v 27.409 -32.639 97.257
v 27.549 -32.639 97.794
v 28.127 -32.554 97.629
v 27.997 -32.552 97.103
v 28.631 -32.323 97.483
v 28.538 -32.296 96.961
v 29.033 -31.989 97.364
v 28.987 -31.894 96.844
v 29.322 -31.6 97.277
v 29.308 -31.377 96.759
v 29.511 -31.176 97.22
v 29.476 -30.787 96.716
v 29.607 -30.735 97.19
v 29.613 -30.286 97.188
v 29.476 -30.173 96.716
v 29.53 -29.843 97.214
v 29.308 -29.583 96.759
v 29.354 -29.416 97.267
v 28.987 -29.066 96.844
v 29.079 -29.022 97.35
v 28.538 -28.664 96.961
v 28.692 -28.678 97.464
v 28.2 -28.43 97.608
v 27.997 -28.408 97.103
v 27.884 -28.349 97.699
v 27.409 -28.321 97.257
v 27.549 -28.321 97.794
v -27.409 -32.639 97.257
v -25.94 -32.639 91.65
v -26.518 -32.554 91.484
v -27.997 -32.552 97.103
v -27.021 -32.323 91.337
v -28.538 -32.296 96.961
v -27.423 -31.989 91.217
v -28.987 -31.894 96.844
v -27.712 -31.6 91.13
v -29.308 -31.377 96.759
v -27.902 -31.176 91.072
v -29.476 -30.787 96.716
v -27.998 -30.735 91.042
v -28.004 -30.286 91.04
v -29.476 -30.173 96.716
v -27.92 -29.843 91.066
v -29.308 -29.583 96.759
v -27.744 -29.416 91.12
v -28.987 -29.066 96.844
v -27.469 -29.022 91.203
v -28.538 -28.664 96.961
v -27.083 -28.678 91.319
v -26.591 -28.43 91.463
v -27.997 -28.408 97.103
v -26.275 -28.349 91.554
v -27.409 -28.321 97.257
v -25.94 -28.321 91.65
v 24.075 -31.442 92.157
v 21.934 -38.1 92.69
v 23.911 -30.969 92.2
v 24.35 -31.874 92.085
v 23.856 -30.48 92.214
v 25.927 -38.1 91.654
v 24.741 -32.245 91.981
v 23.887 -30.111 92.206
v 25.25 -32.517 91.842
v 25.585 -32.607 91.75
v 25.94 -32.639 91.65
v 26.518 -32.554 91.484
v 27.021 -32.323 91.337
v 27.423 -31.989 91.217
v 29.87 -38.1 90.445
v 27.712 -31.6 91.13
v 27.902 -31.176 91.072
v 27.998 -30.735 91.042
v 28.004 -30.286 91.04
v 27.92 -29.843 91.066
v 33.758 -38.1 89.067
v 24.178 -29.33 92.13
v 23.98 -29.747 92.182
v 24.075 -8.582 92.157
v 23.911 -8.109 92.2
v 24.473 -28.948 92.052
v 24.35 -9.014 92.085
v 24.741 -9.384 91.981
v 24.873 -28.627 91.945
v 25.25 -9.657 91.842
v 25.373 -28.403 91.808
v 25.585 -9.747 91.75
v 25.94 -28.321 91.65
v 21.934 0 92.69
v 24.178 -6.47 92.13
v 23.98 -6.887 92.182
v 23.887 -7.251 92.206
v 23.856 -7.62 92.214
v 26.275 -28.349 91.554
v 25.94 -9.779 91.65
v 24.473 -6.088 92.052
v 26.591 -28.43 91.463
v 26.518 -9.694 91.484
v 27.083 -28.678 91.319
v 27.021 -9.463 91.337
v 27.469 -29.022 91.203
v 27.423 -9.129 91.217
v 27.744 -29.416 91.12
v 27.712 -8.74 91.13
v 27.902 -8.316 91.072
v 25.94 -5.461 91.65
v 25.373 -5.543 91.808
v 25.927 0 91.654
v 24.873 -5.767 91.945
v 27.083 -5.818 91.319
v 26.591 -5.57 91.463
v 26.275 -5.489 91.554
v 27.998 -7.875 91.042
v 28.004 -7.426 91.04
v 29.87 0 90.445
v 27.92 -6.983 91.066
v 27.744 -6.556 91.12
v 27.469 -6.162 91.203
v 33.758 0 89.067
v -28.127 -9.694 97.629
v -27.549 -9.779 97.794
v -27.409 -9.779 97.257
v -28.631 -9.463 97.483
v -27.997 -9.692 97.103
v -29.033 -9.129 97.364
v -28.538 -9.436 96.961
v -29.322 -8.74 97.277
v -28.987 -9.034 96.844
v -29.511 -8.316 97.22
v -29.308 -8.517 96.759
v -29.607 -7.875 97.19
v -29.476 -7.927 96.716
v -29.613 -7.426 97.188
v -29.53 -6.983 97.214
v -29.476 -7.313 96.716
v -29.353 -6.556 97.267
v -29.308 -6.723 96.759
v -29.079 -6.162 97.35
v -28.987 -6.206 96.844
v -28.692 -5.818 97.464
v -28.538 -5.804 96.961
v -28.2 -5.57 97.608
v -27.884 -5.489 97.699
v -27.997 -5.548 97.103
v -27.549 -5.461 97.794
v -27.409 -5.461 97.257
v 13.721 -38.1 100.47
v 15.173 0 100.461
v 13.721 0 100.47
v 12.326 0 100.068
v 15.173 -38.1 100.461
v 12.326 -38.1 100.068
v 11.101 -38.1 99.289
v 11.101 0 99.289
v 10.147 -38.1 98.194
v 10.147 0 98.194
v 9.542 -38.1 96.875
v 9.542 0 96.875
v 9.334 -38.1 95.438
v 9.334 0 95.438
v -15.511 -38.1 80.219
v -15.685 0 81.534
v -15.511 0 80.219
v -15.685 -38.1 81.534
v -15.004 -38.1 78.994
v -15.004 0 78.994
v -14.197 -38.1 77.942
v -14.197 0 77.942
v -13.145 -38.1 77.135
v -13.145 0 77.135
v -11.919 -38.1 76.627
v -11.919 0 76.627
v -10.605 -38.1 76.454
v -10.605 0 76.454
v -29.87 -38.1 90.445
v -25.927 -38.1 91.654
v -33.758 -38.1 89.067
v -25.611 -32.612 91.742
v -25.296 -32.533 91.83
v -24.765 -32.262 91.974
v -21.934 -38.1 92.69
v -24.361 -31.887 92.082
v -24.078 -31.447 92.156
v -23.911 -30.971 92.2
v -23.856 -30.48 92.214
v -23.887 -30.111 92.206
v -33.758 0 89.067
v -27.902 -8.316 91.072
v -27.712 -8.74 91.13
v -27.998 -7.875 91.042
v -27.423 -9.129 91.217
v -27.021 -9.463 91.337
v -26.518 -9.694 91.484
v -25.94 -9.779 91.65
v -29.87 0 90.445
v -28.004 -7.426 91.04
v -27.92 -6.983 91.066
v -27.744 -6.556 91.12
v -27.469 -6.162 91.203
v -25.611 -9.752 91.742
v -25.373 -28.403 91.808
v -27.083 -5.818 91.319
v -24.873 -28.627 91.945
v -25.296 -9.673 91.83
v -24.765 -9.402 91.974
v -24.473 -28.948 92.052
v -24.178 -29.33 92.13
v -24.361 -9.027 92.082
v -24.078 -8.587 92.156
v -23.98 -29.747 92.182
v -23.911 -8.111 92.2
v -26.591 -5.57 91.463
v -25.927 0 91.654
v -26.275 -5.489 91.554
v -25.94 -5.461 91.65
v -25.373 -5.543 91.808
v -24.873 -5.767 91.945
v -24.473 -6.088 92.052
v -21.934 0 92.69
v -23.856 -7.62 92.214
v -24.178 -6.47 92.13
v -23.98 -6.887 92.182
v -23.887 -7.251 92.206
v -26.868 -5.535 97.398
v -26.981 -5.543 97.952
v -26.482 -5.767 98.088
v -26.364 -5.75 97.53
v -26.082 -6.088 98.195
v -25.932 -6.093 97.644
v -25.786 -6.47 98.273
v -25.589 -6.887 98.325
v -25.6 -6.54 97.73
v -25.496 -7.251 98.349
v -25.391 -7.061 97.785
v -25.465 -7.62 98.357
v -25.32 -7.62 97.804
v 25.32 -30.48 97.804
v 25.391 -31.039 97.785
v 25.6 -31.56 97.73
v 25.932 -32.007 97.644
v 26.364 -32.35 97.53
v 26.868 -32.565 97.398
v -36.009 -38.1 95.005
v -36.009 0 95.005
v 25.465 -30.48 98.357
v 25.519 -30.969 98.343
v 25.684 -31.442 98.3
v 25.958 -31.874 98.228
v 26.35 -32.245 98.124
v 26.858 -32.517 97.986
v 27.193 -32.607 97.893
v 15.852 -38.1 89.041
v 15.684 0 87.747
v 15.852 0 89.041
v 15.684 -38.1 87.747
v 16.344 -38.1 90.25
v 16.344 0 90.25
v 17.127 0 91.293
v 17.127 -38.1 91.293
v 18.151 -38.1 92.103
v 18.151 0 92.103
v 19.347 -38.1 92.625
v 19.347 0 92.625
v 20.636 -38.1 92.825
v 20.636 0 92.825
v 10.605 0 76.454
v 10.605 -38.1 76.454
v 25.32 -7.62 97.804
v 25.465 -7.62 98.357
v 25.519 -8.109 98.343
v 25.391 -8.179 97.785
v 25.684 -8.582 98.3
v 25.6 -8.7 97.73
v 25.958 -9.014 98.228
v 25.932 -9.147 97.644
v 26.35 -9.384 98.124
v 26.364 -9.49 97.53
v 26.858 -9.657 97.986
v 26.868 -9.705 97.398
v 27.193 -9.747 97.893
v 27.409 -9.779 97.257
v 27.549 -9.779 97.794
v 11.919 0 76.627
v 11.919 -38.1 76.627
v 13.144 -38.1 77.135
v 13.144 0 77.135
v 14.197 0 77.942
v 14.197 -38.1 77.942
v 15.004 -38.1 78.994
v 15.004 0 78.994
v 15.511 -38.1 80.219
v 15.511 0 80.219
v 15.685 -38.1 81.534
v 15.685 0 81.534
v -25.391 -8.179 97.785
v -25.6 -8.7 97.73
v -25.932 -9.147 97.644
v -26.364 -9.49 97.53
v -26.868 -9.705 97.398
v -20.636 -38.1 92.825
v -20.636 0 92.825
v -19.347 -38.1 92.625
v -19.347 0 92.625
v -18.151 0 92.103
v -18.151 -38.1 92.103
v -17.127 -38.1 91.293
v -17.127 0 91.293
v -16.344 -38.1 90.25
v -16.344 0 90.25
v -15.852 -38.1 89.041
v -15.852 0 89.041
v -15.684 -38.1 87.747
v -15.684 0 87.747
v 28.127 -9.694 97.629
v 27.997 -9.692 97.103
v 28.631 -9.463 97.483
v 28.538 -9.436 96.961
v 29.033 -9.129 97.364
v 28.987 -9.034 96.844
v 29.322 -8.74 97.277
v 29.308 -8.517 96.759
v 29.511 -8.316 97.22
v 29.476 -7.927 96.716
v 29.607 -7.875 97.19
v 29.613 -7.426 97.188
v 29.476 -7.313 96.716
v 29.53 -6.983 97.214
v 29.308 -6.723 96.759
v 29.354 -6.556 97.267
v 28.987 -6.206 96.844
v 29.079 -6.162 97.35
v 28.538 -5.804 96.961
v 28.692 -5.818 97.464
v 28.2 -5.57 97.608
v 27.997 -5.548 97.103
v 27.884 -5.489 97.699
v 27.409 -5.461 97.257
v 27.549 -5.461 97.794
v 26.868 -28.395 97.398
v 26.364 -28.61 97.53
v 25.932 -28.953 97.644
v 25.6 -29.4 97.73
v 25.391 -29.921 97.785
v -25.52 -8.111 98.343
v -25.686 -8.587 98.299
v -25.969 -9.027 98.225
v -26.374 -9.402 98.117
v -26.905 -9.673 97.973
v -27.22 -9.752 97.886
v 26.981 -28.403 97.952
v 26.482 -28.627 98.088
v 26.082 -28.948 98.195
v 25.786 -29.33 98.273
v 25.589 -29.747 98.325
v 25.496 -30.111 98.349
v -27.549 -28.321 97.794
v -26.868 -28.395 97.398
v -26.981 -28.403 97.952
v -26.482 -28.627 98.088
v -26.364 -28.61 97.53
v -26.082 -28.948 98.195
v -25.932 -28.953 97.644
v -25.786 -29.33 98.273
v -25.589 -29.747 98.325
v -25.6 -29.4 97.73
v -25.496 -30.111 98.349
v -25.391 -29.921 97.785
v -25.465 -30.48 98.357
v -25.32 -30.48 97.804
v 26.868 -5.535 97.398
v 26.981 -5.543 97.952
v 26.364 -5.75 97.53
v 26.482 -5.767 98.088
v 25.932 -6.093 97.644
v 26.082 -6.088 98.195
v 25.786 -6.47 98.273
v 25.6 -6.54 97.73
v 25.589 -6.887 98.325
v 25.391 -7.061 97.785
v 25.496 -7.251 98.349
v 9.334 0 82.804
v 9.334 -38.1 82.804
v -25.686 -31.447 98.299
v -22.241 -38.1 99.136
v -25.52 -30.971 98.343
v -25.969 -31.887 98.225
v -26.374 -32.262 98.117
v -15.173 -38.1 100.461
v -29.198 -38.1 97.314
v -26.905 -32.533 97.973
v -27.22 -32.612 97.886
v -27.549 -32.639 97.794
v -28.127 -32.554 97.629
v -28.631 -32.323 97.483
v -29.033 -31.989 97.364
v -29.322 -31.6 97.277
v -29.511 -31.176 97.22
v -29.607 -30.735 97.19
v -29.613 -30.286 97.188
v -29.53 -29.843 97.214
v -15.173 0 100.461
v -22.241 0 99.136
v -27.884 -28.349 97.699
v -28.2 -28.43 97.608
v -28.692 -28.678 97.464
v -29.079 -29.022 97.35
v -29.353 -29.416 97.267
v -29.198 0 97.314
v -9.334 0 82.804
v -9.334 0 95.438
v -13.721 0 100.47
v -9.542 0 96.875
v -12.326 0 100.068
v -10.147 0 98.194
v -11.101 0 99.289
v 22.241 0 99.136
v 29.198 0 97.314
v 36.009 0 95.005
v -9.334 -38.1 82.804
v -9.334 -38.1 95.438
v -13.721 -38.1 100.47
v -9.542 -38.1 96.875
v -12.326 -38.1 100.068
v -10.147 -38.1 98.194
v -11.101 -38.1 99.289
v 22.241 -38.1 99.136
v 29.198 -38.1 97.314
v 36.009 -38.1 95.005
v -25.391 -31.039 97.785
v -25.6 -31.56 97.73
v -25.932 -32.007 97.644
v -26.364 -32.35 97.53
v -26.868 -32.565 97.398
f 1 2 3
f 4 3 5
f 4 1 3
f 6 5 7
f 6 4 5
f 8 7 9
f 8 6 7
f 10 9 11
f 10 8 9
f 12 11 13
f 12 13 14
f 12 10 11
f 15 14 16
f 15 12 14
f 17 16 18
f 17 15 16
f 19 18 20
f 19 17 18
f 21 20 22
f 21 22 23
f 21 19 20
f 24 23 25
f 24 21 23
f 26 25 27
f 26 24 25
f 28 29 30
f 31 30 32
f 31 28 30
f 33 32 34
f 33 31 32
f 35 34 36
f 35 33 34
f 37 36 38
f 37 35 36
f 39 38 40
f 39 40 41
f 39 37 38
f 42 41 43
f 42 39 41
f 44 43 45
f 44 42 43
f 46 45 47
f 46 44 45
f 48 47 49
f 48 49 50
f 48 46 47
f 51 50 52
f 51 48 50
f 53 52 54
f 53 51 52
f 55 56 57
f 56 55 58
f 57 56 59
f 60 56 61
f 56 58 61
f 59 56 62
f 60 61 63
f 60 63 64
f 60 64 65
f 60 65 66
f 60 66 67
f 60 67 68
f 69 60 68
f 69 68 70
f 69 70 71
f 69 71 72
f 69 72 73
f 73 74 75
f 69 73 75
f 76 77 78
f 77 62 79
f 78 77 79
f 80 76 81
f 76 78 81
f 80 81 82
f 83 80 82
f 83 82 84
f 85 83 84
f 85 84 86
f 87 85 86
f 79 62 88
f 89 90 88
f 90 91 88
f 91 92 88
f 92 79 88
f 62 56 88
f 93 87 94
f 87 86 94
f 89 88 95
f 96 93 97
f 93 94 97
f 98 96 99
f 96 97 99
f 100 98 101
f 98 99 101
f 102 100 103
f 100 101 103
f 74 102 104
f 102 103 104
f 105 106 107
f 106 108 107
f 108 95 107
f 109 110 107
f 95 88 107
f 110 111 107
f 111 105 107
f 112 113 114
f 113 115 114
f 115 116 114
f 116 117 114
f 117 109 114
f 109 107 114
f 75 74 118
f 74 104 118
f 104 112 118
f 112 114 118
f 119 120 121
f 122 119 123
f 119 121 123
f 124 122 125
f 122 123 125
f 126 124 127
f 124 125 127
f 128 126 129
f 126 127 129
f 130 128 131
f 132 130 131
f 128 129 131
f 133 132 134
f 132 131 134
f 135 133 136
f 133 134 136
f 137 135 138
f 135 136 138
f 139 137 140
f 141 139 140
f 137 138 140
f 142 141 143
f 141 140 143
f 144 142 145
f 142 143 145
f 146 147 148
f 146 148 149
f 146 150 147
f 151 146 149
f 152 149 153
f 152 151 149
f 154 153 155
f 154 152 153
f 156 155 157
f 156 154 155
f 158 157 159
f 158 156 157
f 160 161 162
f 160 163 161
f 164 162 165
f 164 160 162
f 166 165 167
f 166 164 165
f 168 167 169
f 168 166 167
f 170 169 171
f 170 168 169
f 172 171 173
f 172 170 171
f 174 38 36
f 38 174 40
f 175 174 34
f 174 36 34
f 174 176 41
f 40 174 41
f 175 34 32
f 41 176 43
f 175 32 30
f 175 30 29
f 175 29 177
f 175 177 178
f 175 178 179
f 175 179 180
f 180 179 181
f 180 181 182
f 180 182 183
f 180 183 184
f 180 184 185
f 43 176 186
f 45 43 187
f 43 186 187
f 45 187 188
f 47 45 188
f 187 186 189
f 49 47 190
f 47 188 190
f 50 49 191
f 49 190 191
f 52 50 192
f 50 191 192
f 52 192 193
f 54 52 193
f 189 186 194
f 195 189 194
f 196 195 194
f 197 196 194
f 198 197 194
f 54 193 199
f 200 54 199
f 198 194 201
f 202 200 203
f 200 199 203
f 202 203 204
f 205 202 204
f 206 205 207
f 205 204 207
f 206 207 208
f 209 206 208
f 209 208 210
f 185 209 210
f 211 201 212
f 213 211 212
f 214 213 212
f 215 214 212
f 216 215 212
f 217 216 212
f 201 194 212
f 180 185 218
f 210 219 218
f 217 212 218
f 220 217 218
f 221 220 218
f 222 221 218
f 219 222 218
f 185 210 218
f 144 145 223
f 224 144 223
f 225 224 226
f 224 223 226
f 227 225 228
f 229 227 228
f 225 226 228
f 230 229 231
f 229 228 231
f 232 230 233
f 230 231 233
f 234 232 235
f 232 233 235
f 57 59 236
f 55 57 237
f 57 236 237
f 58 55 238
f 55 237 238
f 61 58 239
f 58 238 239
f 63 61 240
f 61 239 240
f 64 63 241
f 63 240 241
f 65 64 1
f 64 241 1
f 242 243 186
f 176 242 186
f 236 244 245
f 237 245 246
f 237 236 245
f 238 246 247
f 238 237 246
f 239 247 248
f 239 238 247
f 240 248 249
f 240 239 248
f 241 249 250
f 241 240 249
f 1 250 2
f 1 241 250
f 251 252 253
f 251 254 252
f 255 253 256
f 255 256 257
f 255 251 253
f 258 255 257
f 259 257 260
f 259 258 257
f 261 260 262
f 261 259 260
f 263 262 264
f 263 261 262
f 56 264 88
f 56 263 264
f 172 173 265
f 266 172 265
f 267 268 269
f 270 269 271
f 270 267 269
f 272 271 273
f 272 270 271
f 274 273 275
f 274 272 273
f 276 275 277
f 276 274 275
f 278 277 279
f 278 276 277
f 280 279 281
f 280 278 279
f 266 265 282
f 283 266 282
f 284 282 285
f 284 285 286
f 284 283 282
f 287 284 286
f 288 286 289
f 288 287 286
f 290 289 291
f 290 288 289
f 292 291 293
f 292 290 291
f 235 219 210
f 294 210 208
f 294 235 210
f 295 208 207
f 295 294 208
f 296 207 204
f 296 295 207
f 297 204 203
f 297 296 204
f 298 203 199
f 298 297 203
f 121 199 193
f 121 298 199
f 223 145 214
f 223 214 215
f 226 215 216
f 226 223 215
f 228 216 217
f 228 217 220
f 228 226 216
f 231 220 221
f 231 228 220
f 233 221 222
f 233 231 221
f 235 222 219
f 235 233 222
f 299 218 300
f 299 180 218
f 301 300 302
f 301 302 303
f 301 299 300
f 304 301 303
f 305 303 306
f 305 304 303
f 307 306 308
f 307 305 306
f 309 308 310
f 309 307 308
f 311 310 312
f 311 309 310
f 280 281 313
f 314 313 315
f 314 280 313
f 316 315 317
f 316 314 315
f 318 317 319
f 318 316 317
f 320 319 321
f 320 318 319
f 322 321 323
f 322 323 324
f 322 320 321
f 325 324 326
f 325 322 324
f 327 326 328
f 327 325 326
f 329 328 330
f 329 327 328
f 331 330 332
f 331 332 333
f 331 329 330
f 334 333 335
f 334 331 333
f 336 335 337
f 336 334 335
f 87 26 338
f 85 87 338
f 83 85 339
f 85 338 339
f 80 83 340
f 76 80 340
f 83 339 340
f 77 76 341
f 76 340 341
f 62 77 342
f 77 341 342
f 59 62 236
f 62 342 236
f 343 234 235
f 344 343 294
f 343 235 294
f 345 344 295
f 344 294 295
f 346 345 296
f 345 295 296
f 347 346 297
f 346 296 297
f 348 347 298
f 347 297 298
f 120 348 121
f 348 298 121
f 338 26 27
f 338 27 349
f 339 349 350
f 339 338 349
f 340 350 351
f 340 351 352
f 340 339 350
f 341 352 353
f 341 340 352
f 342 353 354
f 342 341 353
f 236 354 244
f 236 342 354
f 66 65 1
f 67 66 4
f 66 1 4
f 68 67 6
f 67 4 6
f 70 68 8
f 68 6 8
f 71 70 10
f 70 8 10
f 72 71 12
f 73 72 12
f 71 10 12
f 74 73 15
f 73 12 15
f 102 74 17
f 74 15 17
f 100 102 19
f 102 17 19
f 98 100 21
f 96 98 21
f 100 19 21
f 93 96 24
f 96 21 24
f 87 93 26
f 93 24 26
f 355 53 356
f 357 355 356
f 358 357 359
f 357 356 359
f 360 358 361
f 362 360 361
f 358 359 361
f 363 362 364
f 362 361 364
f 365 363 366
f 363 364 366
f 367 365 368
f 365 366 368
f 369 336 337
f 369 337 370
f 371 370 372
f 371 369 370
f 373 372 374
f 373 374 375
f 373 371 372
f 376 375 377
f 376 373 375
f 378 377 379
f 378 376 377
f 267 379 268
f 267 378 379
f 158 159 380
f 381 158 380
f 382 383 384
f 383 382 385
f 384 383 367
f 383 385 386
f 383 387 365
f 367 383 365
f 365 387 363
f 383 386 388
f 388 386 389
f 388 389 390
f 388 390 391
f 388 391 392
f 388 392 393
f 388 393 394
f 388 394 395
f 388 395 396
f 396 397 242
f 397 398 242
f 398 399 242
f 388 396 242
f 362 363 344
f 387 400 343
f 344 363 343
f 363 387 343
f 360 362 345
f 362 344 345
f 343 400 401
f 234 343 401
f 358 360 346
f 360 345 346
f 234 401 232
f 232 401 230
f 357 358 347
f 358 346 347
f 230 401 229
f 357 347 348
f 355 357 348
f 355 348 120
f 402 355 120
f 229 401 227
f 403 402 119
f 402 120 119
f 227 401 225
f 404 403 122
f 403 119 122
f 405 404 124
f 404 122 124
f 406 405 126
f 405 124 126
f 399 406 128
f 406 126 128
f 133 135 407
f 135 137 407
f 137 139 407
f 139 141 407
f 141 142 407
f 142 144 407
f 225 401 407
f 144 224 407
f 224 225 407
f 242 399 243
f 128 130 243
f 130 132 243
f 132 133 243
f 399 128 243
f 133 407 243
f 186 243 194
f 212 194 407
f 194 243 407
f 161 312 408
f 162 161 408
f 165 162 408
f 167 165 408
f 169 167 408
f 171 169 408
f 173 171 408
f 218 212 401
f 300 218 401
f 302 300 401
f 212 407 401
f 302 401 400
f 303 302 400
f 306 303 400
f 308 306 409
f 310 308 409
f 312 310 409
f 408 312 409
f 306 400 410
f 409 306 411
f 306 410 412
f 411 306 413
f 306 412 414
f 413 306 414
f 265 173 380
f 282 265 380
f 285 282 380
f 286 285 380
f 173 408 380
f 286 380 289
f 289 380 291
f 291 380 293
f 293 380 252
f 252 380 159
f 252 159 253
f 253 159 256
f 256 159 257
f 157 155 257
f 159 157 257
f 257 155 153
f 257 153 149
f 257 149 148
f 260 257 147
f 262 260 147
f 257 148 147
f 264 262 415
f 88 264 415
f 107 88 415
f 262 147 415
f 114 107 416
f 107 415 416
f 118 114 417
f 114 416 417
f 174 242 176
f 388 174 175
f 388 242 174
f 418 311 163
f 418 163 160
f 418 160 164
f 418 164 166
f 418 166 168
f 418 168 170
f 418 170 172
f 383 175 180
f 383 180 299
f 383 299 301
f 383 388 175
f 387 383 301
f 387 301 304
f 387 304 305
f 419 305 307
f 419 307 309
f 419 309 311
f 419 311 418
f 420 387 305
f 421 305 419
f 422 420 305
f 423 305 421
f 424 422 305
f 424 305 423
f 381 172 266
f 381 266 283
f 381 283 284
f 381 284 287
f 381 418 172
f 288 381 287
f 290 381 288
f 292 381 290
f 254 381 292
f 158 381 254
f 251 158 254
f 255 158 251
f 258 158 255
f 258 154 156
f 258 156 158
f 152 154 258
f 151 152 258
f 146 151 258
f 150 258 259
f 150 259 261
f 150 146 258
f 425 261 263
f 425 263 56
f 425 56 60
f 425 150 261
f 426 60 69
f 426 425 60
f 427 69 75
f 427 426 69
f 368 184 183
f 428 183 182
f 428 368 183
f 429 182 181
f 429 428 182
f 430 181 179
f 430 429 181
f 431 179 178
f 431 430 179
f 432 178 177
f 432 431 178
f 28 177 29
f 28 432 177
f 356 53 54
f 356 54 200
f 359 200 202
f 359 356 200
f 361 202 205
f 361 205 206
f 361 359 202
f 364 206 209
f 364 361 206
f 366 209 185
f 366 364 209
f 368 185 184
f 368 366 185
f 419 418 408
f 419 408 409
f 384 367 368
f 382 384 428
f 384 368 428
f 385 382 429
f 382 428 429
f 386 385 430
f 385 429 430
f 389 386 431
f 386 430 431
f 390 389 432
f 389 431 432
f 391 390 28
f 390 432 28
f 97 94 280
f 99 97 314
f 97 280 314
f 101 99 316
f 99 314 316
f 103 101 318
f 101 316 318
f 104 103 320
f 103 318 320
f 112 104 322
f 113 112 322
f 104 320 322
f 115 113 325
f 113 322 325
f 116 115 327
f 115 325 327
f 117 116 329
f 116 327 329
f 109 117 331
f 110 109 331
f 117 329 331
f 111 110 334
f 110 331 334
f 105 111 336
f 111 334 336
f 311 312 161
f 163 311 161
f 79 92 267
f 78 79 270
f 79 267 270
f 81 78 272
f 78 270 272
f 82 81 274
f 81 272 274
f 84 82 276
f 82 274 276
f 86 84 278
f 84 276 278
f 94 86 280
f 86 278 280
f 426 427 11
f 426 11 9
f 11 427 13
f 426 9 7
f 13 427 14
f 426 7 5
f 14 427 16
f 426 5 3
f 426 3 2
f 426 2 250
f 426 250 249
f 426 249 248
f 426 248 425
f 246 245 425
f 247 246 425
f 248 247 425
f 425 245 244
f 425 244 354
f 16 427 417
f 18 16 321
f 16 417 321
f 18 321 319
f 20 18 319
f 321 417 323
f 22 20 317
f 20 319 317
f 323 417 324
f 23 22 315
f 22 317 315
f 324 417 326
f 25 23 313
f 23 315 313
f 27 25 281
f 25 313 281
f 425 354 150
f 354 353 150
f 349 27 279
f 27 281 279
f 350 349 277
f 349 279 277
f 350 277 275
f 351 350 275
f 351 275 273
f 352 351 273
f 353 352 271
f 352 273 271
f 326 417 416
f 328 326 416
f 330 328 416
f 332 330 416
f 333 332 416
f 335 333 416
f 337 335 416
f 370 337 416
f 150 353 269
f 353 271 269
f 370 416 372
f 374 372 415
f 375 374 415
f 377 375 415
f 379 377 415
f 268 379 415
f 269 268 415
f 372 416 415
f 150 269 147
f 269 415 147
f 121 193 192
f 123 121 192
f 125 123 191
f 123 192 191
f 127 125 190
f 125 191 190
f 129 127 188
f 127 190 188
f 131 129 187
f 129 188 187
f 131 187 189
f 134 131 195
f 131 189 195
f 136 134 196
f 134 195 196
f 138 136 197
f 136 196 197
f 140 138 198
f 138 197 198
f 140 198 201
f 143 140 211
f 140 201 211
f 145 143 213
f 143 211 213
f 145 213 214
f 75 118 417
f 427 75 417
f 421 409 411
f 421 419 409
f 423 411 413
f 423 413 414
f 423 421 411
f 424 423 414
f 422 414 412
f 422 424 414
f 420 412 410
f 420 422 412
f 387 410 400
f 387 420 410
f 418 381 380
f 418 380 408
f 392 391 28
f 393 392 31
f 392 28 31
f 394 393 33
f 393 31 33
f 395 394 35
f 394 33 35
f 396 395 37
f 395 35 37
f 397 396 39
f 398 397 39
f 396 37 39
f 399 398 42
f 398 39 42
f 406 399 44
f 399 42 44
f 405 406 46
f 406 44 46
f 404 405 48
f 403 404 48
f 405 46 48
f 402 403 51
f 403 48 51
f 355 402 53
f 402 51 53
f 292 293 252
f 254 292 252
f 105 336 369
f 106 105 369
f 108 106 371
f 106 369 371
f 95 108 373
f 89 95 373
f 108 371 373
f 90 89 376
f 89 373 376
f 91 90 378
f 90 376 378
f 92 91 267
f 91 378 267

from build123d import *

# Parameters (mm, degrees)
F1_DEPTH = 38.1
F2_R     = 5.08
F7_DEPTH = 12.7
F8_DEPTH = 12.7


# Not quite as in the source:
# - a pattern or mirror of a feature is missing from the dataset's text; its kind, count and spacing are read off the source's solid


with BuildPart() as f1:
    # F0 (on Front) → F1 (new body)
    with BuildSketch(Plane.XZ):
        with BuildLine():
            Line((-9.3345, 82.804), (-9.3345, 101.1702876825))
            ThreePointArc((-9.3345, 101.1702876825), (-22.880190841, 98.9901857109), (-36.0086465439, 95.0049334197))
            Line((-36.0086465439, 95.0049334197), (-33.7581061349, 89.067125081))
            ThreePointArc((-33.7581061349, 89.067125081), (-24.8415554365, 91.9535731959), (-15.6845, 93.9497682794))
            Line((-15.6845, 93.9497682794), (-15.6845, 76.454))
            Line((-15.6845, 76.454), (15.6845, 76.454))
            Line((15.6845, 76.454), (15.6845, 93.9497682794))
            ThreePointArc((15.6845, 93.9497682794), (24.8415554365, 91.9535731959), (33.7581061349, 89.067125081))
            Line((33.7581061349, 89.067125081), (36.0086465439, 95.0049334197))
            ThreePointArc((36.0086465439, 95.0049334197), (22.880190841, 98.9901857109), (9.3345, 101.1702876825))
            Line((9.3345, 101.1702876825), (9.3345, 82.804))
            Line((9.3345, 82.804), (-9.3345, 82.804))
        make_face()
    extrude(amount=F1_DEPTH)

    # F2
    f2_edges = [f1.edges().sort_by_distance(p)[0] for p in [
        (-9.3345, -19.05, 101.170288),
        (9.3345, -19.05, 101.170288),
        (15.6845, -19.05, 93.949768),
        (-15.6845, -19.05, 93.949768),
        (15.6845, -19.05, 76.454),
        (-15.6845, -19.05, 76.454),
    ]]
    fillet(f2_edges, radius=F2_R)

    # F4 (on face) → F7 (cut, symmetric)
    with BuildSketch(Plane(origin=(-25.5909022193, 0, 97.7327744919), x_dir=(0.9673862364, 0, 0.2533058814), z_dir=(0.2533058814, 0, -0.9673862364))):
        with BuildLine():
            Line((-1.8789606614, 5.461), (-1.8789606614, 9.779))
            ThreePointArc((-1.8789606614, 9.779), (-4.0379606614, 7.62), (-1.8789606614, 5.461))
        make_face()
    extrude(amount=F7_DEPTH, both=True, mode=Mode.SUBTRACT)

    # F4 (on face) → F8 (cut, symmetric)
    with BuildSketch(Plane(origin=(-25.5909022193, 0, 97.7327744919), x_dir=(0.9673862364, 0, 0.2533058814), z_dir=(0.2533058814, 0, -0.9673862364))):
        with BuildLine():
            ThreePointArc((-1.8789606614, 32.639), (-4.0379606614, 30.48), (-1.8789606614, 28.321))
            Line((-1.8789606614, 28.321), (-1.8789606614, 30.48))
            Line((-1.8789606614, 30.48), (-1.8789606614, 32.639))
        make_face()
        with BuildLine():
            Line((-1.8789606614, 30.48), (-1.8789606614, 28.321))
            ThreePointArc((-1.8789606614, 28.321), (-0.3523171208, 28.9533564594), (0.2800393386, 30.48))
            ThreePointArc((0.2800393386, 30.48), (-0.3523171208, 32.0066435406), (-1.8789606614, 32.639))
            Line((-1.8789606614, 32.639), (-1.8789606614, 30.48))
        make_face()
        with BuildLine():
            ThreePointArc((-1.8789606614, 5.461), (-0.3523171208, 6.0933564594), (0.2800393386, 7.62))
            ThreePointArc((0.2800393386, 7.62), (-0.3523171208, 9.1466435406), (-1.8789606614, 9.779))
            Line((-1.8789606614, 9.779), (-1.8789606614, 5.461))
        make_face()
        with BuildLine():
            Line((-1.8789606614, 5.461), (-1.8789606614, 9.779))
            ThreePointArc((-1.8789606614, 9.779), (-4.0379606614, 7.62), (-1.8789606614, 5.461))
        make_face()
    f8 = extrude(amount=F8_DEPTH, both=True, mode=Mode.SUBTRACT)

    # F8_copies: F8 across plane
    add(f8.mirror(Plane(origin=(6e-06, 0, 0), x_dir=(0, 0, 1), z_dir=(1, 0, 0))), mode=Mode.SUBTRACT)


solid = f1.part
